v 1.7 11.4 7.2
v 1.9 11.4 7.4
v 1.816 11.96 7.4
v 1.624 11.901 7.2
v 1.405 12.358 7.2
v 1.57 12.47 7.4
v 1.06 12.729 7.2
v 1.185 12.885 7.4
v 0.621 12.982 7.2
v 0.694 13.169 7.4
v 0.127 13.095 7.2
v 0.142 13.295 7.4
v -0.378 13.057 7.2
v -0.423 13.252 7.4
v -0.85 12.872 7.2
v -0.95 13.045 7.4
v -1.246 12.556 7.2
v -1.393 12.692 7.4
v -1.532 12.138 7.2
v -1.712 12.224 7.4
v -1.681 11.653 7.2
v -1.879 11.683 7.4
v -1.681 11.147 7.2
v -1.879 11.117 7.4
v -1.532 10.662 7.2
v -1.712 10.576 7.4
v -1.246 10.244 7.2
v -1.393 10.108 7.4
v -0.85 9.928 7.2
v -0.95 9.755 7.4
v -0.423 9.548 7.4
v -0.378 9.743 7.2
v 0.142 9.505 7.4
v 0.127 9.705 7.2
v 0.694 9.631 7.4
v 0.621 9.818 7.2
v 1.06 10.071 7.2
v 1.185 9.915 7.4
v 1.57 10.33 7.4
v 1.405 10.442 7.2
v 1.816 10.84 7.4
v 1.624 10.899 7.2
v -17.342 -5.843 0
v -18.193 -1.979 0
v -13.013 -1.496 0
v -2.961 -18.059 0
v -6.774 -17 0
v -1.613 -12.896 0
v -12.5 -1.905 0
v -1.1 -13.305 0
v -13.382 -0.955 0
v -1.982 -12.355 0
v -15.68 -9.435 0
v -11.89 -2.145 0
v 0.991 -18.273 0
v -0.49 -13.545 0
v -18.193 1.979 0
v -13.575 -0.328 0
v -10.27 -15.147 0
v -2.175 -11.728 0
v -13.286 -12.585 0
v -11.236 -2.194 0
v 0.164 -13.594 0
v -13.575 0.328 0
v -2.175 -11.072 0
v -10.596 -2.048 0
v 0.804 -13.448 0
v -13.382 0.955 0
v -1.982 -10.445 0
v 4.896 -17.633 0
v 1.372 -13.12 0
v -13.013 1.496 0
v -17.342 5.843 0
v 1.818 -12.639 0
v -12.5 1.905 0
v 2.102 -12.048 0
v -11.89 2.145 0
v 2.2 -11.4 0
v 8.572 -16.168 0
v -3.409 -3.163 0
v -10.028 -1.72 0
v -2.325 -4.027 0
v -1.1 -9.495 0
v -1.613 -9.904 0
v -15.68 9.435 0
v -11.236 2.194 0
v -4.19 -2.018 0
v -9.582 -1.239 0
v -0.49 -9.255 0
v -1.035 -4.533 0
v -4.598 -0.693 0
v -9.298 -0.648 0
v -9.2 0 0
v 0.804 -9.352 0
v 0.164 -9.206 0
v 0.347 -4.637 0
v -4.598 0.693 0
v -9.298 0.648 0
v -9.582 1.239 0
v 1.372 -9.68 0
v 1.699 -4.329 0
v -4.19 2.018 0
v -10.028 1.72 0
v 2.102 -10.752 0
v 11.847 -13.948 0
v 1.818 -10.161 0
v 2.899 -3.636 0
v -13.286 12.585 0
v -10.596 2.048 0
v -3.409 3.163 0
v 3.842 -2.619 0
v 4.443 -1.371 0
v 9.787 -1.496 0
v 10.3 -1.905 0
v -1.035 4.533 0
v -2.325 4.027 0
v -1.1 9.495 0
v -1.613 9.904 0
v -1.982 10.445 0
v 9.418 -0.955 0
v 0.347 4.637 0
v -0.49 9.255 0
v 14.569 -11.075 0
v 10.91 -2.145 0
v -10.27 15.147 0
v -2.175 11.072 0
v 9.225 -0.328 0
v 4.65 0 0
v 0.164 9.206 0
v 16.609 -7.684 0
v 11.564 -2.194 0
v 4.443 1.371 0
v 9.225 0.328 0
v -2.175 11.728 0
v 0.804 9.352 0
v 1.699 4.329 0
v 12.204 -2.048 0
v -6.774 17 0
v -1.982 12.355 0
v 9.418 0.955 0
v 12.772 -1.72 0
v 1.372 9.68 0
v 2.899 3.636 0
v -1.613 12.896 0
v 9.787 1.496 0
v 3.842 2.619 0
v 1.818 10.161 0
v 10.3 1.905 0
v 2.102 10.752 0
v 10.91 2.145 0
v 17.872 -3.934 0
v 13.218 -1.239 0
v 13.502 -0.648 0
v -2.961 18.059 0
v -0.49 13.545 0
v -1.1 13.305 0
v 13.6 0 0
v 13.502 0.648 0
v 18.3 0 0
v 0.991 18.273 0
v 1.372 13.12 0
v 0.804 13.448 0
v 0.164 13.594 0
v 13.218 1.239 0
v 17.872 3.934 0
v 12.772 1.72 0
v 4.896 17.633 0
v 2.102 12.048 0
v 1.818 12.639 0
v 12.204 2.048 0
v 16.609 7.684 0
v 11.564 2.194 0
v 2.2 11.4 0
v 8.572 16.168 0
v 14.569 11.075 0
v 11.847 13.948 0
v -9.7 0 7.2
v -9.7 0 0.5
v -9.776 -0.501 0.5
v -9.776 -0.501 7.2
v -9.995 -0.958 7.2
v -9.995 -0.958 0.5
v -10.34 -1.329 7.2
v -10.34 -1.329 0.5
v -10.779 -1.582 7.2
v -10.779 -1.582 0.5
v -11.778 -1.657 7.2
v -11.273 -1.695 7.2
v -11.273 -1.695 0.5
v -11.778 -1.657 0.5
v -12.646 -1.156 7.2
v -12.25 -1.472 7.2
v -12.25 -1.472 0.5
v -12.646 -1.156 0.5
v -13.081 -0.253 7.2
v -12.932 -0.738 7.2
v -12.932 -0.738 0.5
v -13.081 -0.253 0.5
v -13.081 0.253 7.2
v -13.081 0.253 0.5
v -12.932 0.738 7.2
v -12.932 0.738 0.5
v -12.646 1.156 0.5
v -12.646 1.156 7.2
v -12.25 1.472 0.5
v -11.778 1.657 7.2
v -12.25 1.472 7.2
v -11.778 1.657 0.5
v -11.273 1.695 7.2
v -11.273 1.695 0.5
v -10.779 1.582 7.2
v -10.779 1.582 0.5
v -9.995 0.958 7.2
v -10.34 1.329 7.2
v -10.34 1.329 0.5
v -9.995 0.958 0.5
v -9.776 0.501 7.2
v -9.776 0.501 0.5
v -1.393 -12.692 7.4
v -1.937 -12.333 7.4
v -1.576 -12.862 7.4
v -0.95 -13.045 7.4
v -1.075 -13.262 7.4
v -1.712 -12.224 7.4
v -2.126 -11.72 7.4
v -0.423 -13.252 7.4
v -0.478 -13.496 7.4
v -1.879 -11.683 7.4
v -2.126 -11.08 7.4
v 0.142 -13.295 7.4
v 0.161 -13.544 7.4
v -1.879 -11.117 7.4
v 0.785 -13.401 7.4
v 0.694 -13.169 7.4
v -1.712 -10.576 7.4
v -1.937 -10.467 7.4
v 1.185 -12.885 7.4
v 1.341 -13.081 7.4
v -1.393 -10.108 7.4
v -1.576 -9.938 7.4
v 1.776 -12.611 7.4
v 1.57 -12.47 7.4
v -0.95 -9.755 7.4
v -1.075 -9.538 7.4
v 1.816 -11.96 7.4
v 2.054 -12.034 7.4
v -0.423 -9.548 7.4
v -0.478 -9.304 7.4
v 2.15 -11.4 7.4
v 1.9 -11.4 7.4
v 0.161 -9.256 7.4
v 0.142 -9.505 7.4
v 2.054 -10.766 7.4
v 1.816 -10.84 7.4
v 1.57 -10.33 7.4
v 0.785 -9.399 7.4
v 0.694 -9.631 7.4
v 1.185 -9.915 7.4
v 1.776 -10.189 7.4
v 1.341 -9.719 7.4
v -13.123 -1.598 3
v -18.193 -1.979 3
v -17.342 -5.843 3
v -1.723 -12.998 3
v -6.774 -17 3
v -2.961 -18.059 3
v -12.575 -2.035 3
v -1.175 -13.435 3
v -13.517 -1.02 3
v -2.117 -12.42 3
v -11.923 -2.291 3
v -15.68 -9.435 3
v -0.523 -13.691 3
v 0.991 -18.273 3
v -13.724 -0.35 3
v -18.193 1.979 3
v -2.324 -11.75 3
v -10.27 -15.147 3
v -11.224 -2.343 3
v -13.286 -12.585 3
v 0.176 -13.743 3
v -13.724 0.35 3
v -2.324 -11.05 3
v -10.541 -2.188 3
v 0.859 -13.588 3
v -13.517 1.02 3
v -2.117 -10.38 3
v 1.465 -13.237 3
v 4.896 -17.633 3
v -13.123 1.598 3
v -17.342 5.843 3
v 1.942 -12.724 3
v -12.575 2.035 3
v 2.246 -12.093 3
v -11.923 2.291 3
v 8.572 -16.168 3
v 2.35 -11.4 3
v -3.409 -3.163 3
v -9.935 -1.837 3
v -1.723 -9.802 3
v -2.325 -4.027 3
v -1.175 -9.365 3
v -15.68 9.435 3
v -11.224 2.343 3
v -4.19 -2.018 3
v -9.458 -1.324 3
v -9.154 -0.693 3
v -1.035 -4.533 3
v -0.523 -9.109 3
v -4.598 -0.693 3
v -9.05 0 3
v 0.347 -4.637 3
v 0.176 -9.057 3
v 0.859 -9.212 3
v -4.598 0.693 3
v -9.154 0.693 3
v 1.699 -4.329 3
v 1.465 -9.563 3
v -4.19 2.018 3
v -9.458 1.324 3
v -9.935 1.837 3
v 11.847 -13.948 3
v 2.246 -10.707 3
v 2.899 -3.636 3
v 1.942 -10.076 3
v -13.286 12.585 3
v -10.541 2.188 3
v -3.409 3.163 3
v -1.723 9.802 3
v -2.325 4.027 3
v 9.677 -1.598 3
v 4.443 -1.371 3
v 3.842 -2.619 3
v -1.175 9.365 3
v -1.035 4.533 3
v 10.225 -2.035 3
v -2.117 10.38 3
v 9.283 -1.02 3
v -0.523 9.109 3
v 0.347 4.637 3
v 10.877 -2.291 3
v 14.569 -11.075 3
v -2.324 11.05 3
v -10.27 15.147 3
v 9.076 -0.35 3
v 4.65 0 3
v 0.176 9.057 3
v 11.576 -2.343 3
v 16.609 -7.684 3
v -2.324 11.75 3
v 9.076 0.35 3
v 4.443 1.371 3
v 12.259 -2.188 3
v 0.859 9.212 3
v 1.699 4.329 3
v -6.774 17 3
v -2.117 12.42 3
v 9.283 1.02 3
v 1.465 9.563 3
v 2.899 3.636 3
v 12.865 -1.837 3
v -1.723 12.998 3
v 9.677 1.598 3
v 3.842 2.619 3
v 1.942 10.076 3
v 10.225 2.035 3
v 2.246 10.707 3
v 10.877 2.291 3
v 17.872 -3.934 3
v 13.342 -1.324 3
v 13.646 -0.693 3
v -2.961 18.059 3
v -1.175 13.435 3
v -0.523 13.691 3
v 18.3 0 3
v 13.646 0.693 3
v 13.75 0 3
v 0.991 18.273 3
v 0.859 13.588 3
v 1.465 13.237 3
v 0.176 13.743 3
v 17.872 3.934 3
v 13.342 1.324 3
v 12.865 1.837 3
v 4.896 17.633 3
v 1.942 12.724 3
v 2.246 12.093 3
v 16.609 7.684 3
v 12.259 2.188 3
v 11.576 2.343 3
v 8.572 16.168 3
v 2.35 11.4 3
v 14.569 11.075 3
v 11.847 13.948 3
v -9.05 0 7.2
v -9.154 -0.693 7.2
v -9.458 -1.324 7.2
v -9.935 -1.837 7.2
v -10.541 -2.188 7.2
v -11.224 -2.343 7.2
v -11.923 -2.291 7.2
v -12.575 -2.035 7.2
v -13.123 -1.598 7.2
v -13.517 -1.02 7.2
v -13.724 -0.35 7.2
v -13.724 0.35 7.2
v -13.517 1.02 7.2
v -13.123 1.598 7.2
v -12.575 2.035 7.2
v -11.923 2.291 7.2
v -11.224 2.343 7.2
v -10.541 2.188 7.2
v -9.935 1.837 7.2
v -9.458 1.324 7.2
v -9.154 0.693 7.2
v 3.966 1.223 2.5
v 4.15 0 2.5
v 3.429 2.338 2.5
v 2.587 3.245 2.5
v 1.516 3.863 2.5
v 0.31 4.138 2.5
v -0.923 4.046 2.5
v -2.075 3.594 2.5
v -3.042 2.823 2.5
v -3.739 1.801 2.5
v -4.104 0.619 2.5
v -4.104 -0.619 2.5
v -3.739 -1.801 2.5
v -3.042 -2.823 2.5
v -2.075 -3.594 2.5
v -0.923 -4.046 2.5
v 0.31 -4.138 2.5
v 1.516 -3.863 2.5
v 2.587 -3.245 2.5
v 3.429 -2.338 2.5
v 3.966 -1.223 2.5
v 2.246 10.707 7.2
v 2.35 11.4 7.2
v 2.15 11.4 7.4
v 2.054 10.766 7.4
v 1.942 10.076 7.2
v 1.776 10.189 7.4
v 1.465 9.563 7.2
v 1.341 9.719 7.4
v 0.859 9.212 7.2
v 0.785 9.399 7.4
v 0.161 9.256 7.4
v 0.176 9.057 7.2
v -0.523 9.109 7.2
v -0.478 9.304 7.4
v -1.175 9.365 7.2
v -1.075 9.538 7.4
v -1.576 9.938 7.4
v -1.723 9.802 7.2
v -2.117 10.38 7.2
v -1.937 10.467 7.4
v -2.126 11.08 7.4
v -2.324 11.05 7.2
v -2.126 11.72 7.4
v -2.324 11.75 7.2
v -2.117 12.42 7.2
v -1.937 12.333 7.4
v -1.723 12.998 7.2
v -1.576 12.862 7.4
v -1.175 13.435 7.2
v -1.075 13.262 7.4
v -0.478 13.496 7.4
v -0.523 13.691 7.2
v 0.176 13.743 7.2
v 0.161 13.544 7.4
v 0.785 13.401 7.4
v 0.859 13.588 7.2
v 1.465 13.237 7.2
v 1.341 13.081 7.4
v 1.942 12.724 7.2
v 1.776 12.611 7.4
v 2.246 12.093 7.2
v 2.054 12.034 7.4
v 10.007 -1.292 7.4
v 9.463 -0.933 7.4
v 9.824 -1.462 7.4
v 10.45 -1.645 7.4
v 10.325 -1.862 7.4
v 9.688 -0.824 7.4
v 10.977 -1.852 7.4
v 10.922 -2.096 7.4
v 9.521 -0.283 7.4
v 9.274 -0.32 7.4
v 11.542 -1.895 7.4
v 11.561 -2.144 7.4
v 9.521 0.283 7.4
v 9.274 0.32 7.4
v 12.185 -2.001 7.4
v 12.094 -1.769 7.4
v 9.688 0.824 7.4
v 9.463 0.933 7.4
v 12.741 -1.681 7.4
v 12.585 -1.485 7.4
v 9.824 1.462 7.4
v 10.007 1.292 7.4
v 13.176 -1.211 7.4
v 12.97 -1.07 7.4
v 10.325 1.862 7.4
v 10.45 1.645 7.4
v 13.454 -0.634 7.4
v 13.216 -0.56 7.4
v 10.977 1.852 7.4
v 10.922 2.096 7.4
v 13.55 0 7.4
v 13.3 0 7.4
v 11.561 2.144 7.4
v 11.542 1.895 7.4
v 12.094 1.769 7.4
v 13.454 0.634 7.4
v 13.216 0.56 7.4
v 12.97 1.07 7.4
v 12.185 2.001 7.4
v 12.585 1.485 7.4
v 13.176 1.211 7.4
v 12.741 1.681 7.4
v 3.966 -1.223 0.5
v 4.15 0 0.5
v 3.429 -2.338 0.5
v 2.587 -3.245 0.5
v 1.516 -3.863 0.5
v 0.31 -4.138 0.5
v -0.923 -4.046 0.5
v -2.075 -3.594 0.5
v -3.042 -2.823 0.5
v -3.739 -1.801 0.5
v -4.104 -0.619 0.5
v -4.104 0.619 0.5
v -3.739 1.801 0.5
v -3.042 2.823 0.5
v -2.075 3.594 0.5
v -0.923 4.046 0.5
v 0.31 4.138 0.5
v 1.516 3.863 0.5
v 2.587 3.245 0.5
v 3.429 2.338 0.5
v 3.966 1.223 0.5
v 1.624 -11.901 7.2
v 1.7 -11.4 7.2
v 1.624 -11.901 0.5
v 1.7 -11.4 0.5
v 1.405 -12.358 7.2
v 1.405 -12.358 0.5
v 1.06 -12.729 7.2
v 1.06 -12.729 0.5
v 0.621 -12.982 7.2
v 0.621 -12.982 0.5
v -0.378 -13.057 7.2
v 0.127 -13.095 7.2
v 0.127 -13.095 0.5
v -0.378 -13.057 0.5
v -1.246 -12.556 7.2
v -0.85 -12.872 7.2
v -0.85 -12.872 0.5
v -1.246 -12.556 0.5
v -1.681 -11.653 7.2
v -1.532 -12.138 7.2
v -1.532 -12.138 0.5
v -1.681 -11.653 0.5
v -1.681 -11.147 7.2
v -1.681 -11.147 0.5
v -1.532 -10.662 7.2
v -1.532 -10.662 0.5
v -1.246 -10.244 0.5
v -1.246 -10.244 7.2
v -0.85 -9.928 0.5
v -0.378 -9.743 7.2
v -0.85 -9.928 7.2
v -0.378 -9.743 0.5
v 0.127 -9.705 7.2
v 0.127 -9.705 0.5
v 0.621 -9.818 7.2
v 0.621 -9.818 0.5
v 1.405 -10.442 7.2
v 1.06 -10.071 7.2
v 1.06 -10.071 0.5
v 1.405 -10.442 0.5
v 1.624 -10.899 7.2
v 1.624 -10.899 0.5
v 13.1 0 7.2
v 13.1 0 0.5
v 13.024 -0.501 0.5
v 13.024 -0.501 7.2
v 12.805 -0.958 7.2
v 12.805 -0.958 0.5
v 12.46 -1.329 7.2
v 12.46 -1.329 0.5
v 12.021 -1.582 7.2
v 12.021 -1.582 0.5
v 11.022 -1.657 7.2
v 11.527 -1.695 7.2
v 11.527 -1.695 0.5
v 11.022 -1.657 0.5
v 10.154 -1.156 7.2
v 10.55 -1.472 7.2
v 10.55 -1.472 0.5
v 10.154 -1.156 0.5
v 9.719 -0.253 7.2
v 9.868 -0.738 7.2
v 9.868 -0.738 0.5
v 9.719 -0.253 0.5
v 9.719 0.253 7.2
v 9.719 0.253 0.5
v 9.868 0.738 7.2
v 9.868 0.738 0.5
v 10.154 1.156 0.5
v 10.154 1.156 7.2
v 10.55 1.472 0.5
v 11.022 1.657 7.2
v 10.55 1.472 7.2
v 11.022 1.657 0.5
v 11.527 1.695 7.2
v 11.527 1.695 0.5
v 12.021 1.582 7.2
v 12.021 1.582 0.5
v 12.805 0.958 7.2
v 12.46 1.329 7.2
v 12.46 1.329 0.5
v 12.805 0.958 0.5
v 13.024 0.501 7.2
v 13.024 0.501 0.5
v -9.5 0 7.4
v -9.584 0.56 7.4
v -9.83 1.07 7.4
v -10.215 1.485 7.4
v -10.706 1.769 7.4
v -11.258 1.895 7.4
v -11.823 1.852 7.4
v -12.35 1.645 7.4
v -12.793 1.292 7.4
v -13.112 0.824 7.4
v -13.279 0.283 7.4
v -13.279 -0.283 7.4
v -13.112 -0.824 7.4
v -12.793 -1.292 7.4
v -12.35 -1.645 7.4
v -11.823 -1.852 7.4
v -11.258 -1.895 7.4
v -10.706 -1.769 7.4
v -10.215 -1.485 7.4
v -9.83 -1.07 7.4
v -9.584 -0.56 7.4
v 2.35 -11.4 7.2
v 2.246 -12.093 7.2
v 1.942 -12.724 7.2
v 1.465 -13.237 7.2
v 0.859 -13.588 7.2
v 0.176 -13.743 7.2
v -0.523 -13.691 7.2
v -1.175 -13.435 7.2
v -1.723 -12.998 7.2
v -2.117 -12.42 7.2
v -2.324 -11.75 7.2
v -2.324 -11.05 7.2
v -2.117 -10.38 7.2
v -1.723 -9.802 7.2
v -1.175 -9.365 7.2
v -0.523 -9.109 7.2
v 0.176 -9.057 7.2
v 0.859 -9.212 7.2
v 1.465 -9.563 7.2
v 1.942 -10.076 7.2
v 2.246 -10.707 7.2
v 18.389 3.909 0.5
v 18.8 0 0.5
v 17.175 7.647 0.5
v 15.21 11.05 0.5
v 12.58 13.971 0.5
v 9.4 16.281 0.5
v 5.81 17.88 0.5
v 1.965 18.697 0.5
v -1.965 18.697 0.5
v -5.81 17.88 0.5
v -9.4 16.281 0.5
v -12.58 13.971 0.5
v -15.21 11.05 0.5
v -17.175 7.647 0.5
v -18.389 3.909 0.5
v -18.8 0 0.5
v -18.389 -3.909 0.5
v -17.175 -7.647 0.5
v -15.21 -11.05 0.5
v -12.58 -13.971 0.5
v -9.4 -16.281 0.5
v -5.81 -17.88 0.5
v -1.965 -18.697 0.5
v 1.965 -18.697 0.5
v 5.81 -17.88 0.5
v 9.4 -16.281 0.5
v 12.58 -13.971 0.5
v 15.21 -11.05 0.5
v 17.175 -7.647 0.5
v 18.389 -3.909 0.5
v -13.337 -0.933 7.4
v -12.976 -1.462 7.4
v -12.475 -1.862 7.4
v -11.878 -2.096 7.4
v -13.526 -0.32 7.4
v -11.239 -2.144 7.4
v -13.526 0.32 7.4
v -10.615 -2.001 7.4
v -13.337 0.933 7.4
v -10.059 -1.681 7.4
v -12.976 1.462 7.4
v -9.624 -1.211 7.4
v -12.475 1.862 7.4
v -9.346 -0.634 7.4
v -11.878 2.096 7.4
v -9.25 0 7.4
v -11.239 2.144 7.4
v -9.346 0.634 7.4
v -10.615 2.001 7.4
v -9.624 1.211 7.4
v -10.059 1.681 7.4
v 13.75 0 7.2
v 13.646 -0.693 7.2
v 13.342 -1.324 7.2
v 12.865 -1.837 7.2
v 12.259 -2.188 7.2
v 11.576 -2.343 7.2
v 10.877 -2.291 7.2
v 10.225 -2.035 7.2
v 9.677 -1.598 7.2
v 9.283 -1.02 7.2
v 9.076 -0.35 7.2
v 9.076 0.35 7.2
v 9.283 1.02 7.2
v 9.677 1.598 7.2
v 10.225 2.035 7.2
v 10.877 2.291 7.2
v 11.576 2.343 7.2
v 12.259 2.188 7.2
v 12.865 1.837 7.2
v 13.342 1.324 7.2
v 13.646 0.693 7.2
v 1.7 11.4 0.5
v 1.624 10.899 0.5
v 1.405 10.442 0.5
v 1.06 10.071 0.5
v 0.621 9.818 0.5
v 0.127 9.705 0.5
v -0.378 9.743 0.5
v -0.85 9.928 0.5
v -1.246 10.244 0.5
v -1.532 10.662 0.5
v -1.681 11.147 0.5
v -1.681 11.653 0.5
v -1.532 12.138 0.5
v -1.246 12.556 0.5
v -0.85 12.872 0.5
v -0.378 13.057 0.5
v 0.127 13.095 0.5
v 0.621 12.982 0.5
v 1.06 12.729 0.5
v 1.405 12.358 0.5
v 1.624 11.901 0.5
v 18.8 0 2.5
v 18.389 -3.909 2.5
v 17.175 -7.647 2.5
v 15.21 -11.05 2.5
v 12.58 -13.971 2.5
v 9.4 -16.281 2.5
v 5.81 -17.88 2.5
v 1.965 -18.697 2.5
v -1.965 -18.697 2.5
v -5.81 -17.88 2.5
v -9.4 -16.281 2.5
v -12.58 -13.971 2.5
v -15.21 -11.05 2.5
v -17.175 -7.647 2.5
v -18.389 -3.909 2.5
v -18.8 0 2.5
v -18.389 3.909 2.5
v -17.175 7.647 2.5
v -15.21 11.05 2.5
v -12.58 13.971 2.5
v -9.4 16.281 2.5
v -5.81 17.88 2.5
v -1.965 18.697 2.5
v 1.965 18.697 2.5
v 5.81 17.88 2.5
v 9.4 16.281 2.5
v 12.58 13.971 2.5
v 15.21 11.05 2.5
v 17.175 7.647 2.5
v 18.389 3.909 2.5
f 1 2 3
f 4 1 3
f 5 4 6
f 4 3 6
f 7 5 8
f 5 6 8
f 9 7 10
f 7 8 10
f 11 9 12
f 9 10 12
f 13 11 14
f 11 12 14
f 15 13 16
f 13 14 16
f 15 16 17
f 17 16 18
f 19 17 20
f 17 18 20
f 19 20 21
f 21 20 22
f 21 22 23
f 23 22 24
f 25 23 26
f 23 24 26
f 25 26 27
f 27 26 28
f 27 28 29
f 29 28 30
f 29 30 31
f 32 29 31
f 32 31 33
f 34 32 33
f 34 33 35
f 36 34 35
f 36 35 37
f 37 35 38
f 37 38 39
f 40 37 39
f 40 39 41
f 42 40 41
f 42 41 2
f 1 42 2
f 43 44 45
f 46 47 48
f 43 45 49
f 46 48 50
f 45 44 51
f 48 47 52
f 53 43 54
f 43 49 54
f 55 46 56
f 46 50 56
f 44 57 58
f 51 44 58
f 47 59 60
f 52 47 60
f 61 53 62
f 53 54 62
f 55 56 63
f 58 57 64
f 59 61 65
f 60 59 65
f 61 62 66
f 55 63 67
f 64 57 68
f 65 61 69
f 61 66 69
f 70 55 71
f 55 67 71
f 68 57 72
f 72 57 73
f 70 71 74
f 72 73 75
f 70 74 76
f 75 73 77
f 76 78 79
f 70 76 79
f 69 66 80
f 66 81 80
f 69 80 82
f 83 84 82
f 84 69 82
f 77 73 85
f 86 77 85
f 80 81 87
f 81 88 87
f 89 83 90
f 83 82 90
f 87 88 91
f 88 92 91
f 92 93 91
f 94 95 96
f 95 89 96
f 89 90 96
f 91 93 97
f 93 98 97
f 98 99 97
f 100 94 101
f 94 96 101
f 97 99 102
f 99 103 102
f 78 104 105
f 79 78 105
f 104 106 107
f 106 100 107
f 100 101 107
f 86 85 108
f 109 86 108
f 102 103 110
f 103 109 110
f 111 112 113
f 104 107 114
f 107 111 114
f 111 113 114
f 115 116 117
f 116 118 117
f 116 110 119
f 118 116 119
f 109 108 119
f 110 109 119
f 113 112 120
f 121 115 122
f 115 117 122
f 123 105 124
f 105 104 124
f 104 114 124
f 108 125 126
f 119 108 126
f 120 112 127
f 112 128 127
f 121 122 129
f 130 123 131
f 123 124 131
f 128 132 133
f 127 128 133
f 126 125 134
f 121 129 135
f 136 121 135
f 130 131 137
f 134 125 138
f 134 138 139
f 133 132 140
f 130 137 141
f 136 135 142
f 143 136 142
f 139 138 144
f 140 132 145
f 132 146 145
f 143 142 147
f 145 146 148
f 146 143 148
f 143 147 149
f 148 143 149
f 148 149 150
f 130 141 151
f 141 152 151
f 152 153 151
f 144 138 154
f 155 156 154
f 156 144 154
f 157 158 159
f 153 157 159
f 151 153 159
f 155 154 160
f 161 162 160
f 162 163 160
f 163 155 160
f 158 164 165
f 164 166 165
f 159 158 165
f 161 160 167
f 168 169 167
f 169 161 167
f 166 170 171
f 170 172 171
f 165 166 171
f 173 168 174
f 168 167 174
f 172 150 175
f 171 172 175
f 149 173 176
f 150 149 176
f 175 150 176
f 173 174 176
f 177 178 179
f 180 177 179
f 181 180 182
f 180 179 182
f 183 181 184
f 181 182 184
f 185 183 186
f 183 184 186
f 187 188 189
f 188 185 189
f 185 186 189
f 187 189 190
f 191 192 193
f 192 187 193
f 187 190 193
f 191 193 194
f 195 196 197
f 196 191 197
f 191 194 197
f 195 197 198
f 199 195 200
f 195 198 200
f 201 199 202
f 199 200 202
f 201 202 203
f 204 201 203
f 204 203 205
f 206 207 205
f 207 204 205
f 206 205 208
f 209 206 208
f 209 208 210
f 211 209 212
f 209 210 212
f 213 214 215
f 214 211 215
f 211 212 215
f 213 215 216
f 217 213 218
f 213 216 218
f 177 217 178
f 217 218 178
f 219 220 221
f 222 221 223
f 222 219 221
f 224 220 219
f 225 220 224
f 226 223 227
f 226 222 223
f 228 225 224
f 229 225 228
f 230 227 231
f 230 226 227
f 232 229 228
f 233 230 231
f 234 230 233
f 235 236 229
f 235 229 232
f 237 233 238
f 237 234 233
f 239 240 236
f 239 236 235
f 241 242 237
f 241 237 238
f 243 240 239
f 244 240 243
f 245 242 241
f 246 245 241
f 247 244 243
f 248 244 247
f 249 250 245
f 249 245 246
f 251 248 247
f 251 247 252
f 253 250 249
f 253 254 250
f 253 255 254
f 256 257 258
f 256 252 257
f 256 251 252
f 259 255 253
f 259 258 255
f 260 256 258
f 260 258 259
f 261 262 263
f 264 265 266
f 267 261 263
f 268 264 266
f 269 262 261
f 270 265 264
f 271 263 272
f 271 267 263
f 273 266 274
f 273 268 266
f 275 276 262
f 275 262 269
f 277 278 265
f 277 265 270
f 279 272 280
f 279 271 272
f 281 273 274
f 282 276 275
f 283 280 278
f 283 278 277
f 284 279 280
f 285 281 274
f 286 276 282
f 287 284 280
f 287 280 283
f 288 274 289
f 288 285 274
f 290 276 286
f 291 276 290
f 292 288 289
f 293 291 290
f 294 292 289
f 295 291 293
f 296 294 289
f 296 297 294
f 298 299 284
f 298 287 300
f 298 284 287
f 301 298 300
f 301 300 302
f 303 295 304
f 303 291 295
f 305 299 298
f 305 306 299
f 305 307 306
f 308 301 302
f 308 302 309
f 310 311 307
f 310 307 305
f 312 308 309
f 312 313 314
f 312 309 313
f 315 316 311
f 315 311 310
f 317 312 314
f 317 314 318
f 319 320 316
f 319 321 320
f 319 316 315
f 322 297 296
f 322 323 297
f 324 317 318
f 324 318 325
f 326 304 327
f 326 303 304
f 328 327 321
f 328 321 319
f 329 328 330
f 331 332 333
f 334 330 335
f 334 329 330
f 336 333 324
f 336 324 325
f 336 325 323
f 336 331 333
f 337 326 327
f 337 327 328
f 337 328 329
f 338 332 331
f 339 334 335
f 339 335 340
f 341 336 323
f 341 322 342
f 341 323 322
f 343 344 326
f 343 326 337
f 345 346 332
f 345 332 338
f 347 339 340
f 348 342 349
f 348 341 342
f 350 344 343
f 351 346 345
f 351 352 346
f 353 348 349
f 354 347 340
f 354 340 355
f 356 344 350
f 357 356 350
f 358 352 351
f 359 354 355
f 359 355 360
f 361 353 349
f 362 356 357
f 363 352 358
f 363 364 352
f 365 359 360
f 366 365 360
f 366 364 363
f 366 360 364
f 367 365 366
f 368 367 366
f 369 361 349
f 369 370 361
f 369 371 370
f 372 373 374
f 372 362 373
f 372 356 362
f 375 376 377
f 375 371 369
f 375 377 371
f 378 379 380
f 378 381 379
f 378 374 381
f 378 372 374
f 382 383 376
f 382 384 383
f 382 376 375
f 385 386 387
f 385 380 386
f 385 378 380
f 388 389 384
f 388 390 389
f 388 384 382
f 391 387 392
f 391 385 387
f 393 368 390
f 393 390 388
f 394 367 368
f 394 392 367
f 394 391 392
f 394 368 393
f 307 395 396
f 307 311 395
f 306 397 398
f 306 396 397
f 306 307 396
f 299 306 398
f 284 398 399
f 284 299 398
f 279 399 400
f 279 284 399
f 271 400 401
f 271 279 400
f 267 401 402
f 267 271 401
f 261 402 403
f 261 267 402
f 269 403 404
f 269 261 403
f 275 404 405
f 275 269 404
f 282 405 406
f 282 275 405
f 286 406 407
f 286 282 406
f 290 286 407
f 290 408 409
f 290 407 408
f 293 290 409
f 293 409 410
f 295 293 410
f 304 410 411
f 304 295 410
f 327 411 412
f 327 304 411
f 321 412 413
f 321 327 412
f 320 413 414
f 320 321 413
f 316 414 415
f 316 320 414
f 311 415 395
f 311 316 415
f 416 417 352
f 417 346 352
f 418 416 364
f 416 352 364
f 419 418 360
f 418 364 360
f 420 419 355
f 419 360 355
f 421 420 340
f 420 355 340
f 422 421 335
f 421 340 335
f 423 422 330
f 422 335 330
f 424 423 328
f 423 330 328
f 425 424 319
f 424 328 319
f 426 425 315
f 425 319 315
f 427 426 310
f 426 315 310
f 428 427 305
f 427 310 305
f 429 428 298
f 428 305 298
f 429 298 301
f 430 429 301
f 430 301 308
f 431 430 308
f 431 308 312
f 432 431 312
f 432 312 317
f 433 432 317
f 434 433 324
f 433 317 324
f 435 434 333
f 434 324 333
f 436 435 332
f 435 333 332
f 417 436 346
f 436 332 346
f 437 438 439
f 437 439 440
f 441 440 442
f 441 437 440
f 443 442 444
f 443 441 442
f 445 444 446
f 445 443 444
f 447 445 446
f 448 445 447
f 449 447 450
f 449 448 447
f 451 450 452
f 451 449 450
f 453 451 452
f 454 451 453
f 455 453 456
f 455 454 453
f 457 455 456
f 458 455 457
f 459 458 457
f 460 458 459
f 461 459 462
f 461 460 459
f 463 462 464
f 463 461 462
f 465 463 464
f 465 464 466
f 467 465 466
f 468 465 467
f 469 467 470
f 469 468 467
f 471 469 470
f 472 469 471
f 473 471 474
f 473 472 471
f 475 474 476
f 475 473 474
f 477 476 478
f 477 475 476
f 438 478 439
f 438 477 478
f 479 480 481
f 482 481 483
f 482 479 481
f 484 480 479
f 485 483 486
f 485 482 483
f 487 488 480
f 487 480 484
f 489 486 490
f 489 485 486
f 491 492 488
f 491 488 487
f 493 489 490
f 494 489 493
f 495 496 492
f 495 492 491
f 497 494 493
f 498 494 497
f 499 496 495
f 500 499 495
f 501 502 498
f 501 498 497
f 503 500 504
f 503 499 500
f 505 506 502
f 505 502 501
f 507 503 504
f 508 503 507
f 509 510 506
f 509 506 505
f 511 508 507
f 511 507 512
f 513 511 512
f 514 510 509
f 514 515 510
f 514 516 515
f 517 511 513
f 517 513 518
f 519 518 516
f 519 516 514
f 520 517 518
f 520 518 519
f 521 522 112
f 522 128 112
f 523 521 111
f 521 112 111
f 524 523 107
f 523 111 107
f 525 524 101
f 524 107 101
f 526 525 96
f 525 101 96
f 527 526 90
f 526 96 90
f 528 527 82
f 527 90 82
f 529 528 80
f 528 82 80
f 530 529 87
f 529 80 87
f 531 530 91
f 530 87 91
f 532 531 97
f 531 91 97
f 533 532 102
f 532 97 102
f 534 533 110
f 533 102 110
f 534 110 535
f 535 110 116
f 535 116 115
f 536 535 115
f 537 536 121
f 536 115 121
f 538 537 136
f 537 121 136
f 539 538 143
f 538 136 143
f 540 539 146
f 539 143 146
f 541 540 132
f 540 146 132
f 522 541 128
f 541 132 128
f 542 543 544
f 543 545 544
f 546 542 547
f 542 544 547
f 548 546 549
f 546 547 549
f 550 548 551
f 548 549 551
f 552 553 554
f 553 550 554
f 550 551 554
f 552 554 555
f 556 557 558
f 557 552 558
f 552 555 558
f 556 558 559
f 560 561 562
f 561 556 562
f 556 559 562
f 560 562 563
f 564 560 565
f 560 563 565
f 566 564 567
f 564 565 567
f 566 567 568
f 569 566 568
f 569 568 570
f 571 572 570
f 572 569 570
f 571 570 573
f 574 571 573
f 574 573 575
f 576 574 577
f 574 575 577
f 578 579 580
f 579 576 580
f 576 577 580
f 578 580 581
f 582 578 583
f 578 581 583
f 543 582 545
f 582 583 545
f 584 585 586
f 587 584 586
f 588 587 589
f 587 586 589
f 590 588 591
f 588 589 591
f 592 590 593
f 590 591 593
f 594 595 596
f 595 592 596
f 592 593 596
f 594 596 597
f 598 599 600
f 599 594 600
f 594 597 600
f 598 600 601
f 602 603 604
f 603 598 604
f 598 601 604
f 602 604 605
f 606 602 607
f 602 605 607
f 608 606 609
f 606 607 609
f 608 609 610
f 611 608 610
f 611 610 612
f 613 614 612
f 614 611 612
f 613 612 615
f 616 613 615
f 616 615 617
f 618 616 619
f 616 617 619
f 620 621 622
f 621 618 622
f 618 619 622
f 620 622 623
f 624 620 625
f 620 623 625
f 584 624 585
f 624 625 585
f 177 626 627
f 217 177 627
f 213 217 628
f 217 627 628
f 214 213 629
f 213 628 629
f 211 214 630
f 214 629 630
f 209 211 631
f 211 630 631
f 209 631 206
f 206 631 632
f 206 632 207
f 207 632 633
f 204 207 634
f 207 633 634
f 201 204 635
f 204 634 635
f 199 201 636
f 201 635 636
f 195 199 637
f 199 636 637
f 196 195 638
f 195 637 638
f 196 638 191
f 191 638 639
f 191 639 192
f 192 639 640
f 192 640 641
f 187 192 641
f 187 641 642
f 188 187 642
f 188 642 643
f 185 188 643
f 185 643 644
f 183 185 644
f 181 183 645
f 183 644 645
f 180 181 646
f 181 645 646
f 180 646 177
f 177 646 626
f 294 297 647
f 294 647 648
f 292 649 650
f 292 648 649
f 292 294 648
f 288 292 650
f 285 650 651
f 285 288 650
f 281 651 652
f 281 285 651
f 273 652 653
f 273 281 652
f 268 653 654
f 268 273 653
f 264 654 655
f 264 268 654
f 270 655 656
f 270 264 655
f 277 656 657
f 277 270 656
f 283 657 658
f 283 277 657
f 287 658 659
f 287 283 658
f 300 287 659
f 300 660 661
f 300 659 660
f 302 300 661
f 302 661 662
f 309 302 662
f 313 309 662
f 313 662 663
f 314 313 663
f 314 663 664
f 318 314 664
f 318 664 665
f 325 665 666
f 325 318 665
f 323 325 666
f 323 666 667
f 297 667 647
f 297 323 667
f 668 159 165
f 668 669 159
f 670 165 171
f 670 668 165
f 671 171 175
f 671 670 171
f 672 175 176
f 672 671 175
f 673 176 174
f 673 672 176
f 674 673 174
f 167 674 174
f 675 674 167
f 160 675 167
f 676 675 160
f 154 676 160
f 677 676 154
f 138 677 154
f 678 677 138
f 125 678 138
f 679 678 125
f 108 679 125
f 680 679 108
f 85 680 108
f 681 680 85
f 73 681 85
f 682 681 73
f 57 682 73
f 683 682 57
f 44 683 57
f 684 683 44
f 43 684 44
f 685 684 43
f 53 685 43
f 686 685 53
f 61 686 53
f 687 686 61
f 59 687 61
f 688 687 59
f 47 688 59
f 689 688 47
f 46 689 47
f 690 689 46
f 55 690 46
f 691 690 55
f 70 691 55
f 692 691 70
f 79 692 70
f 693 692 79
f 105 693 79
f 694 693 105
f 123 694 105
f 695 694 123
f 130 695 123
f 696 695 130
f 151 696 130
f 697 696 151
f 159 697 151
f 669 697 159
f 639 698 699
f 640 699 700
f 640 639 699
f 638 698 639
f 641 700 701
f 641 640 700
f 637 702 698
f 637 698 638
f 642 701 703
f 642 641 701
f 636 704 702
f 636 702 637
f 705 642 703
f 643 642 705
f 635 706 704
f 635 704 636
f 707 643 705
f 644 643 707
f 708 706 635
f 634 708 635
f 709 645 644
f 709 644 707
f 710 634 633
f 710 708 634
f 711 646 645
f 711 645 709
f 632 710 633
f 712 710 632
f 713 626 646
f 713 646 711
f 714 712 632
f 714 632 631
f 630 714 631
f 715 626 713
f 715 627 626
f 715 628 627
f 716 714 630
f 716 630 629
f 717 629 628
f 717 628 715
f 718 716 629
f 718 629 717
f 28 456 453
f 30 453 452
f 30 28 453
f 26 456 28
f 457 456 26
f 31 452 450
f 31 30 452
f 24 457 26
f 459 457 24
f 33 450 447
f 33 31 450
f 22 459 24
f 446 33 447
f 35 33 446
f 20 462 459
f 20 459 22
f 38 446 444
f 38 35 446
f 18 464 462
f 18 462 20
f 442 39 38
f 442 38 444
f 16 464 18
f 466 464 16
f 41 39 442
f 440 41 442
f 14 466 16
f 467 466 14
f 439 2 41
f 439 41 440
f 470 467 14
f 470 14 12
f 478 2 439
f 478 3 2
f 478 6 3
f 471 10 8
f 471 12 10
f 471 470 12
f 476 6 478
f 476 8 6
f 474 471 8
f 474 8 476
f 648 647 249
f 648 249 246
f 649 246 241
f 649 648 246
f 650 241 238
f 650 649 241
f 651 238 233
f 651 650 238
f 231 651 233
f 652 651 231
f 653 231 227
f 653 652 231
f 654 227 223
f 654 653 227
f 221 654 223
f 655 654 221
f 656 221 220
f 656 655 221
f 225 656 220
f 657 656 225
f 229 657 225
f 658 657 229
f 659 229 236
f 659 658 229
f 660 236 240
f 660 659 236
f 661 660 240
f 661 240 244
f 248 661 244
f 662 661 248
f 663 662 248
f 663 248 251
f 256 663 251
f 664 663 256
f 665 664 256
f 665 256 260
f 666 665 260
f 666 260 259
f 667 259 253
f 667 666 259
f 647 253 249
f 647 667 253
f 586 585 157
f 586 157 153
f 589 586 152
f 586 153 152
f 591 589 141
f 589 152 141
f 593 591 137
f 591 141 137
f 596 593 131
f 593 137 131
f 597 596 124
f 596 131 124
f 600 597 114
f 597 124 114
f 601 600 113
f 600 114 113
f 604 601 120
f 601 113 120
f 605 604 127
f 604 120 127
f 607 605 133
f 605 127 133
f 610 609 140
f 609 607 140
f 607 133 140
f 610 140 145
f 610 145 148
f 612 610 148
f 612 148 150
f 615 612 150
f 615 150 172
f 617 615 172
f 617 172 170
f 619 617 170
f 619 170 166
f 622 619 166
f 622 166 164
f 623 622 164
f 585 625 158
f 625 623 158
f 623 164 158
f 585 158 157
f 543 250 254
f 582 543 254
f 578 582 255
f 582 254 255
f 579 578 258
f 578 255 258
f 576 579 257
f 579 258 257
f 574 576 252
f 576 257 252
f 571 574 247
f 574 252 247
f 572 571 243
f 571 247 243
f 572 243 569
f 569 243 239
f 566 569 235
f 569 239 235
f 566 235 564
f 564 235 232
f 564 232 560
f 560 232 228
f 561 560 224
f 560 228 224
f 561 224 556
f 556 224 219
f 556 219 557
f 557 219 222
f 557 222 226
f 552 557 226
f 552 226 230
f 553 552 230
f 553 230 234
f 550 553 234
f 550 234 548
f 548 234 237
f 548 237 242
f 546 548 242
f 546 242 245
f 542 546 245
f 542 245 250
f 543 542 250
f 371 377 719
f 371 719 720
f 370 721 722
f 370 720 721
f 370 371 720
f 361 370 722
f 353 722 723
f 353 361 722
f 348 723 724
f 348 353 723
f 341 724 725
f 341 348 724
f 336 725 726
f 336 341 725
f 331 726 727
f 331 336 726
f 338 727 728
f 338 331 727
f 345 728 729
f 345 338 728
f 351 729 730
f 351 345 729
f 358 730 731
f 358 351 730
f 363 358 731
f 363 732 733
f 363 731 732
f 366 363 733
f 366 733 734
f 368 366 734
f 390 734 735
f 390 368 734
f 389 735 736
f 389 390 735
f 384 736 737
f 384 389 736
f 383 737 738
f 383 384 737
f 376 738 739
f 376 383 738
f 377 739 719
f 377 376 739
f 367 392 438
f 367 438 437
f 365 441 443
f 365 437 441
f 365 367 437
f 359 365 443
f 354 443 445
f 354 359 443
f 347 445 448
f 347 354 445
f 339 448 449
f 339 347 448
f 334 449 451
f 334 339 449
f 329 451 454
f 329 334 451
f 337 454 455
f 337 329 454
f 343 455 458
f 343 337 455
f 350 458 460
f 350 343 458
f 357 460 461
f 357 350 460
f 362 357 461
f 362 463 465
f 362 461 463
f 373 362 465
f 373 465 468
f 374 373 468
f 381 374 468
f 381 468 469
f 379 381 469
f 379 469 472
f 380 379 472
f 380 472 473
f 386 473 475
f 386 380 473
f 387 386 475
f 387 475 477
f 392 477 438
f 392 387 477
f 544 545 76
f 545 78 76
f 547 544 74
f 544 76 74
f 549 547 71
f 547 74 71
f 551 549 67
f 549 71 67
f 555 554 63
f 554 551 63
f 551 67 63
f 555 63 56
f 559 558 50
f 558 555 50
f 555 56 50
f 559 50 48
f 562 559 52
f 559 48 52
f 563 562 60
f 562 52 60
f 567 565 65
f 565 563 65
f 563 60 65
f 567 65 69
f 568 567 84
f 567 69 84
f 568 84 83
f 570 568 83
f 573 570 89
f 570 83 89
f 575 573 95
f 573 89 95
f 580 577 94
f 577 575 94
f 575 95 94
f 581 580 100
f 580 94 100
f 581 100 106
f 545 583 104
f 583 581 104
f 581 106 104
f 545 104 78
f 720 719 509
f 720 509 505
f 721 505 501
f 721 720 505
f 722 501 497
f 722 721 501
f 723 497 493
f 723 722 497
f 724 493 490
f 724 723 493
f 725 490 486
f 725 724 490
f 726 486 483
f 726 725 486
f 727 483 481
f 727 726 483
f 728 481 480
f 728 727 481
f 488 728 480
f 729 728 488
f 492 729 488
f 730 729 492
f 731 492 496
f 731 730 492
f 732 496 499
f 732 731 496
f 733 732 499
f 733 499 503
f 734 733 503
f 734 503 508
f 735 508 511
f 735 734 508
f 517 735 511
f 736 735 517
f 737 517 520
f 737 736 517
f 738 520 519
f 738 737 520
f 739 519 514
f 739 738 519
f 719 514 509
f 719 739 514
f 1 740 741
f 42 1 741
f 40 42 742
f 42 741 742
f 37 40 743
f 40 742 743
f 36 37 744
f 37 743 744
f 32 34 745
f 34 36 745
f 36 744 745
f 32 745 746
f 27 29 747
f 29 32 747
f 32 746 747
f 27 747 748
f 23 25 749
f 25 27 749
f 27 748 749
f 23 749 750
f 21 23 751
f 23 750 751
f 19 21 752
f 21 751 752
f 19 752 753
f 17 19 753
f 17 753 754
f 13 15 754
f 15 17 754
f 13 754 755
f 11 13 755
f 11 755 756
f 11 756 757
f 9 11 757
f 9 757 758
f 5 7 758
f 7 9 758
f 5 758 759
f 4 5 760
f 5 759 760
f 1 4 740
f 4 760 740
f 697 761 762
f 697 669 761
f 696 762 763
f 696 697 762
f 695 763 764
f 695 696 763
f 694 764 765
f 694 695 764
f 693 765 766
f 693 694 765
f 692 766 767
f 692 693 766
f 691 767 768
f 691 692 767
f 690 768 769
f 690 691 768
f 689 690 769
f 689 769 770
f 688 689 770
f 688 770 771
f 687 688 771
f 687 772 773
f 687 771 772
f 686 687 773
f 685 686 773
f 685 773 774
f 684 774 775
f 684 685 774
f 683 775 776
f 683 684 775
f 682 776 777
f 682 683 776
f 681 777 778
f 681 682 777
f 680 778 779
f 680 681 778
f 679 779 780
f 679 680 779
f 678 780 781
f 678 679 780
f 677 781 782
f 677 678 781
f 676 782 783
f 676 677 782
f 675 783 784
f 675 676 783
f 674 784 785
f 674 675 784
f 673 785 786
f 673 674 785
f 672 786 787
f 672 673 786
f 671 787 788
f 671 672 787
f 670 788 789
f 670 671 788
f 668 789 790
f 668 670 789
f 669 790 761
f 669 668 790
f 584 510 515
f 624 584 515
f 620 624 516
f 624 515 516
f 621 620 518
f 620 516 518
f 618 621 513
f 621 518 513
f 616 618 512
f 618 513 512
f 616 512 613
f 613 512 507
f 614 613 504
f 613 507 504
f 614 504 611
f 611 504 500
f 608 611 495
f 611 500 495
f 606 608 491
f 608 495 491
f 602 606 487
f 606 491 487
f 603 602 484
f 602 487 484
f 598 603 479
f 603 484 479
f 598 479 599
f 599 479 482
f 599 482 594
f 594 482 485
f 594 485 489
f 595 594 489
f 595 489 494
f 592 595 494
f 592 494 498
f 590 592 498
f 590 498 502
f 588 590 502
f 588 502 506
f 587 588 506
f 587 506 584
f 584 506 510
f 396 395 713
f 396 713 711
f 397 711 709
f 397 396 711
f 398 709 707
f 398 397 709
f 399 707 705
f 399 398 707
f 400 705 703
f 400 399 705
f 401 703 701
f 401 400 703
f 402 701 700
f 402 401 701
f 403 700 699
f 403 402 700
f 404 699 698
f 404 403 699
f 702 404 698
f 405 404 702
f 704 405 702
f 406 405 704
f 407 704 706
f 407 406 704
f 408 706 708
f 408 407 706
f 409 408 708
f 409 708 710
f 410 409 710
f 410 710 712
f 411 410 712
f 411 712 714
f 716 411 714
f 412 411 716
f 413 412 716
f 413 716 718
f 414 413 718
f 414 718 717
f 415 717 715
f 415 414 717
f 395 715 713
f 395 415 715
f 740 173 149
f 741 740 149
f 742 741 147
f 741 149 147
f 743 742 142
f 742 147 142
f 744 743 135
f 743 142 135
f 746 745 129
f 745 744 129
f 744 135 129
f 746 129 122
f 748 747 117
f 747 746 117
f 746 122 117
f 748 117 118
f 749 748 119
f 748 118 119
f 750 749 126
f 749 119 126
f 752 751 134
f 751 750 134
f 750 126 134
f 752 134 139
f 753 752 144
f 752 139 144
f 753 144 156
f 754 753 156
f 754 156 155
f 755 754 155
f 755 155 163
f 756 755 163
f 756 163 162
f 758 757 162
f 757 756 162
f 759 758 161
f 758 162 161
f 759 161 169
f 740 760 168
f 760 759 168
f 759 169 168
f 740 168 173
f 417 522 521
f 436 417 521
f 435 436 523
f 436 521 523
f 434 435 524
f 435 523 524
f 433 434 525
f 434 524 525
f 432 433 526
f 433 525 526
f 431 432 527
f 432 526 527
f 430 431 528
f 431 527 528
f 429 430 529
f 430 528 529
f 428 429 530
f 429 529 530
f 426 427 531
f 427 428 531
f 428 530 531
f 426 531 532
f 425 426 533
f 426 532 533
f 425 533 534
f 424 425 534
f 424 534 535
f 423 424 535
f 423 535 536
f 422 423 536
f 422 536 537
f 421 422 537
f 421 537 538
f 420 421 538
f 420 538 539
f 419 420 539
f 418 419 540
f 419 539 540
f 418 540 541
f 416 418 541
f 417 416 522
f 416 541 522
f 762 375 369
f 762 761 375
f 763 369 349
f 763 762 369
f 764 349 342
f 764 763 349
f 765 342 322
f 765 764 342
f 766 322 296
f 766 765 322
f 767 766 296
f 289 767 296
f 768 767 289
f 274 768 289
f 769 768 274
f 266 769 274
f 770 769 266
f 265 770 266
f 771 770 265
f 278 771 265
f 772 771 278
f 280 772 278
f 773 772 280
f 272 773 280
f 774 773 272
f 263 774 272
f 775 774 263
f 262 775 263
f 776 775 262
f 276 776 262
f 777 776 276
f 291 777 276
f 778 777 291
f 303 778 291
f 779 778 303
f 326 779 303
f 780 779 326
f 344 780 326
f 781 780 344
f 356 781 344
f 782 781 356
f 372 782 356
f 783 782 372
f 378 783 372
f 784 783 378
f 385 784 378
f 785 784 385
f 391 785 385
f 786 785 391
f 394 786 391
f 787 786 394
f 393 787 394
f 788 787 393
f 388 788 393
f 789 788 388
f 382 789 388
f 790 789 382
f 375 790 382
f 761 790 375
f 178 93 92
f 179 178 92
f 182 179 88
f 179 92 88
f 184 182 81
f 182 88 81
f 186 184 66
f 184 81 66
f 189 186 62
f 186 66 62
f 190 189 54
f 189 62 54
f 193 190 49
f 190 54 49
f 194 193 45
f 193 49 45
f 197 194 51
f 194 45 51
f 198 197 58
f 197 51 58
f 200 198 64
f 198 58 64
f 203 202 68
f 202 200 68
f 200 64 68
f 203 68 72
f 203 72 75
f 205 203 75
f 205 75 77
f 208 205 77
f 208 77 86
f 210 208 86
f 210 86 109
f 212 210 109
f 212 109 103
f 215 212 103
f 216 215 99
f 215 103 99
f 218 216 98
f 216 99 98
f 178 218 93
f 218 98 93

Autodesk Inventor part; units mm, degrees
ref_plane "YZ Plane" through (0, 0, 0) normal (1, 0, 0) x (0, 1, 0)
ref_plane "XZ Plane" through (0, 0, 0) normal (0, 1, 0) x (-1, 0, 0)
ref_plane "XY Plane" through (0, 0, 0) normal (0, 0, 1) x (1, 0, 0)
sketch "Sketch1" plane through (0, 0, 0) normal (0, 0, 1) x (1, 0, 0)
  circle A0 centre (0, 0) radius 18.8
  circle A1 centre (0, 0) radius 4.15
  circle A2 centre (11.4, 0) radius 1.7
  circle A3 centre (0, 11.4) radius 1.7
  circle A4 centre (-11.4, 0) radius 1.7
  circle A5 centre (0, -11.4) radius 1.7
  dimension "d2" = 37.6
  dimension "d3" = 8.3
  dimension "d6" = 3.4
  dimension "d7" = 11.4
  dimension "d10" = 360
extrude "Extrusion1" add sketch "Sketch1" along normal blind 3
sketch "Sketch2" plane through (0, 0, 3) normal (0, 0, 1) x (1, 0, 0)
  circle A0 centre (0, 0) radius 4.15 projected
  circle A1 centre (0, -11.4) radius 1.7 projected
  circle A2 centre (-11.4, 0) radius 1.7 projected
  circle A3 centre (0, 11.4) radius 1.7 projected
  circle A4 centre (11.4, 0) radius 1.7 projected
  circle A5 centre (0, 0) radius 18.8 projected
  circle A6 centre (11.4, 0) radius 2.35
  circle A7 centre (0, 11.4) radius 2.35
  circle A8 centre (-11.4, 0) radius 2.35
  circle A9 centre (0, -11.4) radius 2.35
  dimension "d12" = 4.7
  dimension "d15" = 360
extrude "Extrusion2" add sketch "Sketch2" along normal blind 4.4 contours A6 | A7 | A8 | A9
chamfer "Chamfer1" distance 0.5 angle 45 8 edges at (-18.8, 0, 3) (-18.8, 0, 0) (-4.15, 0, 3) (-4.15, 0, 0) (-1.7, -11.4, 0) (9.7, 0, 0) (-1.7, 11.4, 0) (-13.1, 0, 0)
chamfer "Chamfer2" distance 0.2 angle 45 8 edges at (-13.75, 0, 7.4) (-13.1, 0, 7.4) (-1.7, 11.4, 7.4) (-2.35, 11.4, 7.4) (9.7, 0, 7.4) (9.05, 0, 7.4) (-1.7, -11.4, 7.4) (-2.35, -11.4, 7.4)
properties part number "Gear_Base_11.4mmD_4x_4.7mmW_3mmH_4.4mmE"
